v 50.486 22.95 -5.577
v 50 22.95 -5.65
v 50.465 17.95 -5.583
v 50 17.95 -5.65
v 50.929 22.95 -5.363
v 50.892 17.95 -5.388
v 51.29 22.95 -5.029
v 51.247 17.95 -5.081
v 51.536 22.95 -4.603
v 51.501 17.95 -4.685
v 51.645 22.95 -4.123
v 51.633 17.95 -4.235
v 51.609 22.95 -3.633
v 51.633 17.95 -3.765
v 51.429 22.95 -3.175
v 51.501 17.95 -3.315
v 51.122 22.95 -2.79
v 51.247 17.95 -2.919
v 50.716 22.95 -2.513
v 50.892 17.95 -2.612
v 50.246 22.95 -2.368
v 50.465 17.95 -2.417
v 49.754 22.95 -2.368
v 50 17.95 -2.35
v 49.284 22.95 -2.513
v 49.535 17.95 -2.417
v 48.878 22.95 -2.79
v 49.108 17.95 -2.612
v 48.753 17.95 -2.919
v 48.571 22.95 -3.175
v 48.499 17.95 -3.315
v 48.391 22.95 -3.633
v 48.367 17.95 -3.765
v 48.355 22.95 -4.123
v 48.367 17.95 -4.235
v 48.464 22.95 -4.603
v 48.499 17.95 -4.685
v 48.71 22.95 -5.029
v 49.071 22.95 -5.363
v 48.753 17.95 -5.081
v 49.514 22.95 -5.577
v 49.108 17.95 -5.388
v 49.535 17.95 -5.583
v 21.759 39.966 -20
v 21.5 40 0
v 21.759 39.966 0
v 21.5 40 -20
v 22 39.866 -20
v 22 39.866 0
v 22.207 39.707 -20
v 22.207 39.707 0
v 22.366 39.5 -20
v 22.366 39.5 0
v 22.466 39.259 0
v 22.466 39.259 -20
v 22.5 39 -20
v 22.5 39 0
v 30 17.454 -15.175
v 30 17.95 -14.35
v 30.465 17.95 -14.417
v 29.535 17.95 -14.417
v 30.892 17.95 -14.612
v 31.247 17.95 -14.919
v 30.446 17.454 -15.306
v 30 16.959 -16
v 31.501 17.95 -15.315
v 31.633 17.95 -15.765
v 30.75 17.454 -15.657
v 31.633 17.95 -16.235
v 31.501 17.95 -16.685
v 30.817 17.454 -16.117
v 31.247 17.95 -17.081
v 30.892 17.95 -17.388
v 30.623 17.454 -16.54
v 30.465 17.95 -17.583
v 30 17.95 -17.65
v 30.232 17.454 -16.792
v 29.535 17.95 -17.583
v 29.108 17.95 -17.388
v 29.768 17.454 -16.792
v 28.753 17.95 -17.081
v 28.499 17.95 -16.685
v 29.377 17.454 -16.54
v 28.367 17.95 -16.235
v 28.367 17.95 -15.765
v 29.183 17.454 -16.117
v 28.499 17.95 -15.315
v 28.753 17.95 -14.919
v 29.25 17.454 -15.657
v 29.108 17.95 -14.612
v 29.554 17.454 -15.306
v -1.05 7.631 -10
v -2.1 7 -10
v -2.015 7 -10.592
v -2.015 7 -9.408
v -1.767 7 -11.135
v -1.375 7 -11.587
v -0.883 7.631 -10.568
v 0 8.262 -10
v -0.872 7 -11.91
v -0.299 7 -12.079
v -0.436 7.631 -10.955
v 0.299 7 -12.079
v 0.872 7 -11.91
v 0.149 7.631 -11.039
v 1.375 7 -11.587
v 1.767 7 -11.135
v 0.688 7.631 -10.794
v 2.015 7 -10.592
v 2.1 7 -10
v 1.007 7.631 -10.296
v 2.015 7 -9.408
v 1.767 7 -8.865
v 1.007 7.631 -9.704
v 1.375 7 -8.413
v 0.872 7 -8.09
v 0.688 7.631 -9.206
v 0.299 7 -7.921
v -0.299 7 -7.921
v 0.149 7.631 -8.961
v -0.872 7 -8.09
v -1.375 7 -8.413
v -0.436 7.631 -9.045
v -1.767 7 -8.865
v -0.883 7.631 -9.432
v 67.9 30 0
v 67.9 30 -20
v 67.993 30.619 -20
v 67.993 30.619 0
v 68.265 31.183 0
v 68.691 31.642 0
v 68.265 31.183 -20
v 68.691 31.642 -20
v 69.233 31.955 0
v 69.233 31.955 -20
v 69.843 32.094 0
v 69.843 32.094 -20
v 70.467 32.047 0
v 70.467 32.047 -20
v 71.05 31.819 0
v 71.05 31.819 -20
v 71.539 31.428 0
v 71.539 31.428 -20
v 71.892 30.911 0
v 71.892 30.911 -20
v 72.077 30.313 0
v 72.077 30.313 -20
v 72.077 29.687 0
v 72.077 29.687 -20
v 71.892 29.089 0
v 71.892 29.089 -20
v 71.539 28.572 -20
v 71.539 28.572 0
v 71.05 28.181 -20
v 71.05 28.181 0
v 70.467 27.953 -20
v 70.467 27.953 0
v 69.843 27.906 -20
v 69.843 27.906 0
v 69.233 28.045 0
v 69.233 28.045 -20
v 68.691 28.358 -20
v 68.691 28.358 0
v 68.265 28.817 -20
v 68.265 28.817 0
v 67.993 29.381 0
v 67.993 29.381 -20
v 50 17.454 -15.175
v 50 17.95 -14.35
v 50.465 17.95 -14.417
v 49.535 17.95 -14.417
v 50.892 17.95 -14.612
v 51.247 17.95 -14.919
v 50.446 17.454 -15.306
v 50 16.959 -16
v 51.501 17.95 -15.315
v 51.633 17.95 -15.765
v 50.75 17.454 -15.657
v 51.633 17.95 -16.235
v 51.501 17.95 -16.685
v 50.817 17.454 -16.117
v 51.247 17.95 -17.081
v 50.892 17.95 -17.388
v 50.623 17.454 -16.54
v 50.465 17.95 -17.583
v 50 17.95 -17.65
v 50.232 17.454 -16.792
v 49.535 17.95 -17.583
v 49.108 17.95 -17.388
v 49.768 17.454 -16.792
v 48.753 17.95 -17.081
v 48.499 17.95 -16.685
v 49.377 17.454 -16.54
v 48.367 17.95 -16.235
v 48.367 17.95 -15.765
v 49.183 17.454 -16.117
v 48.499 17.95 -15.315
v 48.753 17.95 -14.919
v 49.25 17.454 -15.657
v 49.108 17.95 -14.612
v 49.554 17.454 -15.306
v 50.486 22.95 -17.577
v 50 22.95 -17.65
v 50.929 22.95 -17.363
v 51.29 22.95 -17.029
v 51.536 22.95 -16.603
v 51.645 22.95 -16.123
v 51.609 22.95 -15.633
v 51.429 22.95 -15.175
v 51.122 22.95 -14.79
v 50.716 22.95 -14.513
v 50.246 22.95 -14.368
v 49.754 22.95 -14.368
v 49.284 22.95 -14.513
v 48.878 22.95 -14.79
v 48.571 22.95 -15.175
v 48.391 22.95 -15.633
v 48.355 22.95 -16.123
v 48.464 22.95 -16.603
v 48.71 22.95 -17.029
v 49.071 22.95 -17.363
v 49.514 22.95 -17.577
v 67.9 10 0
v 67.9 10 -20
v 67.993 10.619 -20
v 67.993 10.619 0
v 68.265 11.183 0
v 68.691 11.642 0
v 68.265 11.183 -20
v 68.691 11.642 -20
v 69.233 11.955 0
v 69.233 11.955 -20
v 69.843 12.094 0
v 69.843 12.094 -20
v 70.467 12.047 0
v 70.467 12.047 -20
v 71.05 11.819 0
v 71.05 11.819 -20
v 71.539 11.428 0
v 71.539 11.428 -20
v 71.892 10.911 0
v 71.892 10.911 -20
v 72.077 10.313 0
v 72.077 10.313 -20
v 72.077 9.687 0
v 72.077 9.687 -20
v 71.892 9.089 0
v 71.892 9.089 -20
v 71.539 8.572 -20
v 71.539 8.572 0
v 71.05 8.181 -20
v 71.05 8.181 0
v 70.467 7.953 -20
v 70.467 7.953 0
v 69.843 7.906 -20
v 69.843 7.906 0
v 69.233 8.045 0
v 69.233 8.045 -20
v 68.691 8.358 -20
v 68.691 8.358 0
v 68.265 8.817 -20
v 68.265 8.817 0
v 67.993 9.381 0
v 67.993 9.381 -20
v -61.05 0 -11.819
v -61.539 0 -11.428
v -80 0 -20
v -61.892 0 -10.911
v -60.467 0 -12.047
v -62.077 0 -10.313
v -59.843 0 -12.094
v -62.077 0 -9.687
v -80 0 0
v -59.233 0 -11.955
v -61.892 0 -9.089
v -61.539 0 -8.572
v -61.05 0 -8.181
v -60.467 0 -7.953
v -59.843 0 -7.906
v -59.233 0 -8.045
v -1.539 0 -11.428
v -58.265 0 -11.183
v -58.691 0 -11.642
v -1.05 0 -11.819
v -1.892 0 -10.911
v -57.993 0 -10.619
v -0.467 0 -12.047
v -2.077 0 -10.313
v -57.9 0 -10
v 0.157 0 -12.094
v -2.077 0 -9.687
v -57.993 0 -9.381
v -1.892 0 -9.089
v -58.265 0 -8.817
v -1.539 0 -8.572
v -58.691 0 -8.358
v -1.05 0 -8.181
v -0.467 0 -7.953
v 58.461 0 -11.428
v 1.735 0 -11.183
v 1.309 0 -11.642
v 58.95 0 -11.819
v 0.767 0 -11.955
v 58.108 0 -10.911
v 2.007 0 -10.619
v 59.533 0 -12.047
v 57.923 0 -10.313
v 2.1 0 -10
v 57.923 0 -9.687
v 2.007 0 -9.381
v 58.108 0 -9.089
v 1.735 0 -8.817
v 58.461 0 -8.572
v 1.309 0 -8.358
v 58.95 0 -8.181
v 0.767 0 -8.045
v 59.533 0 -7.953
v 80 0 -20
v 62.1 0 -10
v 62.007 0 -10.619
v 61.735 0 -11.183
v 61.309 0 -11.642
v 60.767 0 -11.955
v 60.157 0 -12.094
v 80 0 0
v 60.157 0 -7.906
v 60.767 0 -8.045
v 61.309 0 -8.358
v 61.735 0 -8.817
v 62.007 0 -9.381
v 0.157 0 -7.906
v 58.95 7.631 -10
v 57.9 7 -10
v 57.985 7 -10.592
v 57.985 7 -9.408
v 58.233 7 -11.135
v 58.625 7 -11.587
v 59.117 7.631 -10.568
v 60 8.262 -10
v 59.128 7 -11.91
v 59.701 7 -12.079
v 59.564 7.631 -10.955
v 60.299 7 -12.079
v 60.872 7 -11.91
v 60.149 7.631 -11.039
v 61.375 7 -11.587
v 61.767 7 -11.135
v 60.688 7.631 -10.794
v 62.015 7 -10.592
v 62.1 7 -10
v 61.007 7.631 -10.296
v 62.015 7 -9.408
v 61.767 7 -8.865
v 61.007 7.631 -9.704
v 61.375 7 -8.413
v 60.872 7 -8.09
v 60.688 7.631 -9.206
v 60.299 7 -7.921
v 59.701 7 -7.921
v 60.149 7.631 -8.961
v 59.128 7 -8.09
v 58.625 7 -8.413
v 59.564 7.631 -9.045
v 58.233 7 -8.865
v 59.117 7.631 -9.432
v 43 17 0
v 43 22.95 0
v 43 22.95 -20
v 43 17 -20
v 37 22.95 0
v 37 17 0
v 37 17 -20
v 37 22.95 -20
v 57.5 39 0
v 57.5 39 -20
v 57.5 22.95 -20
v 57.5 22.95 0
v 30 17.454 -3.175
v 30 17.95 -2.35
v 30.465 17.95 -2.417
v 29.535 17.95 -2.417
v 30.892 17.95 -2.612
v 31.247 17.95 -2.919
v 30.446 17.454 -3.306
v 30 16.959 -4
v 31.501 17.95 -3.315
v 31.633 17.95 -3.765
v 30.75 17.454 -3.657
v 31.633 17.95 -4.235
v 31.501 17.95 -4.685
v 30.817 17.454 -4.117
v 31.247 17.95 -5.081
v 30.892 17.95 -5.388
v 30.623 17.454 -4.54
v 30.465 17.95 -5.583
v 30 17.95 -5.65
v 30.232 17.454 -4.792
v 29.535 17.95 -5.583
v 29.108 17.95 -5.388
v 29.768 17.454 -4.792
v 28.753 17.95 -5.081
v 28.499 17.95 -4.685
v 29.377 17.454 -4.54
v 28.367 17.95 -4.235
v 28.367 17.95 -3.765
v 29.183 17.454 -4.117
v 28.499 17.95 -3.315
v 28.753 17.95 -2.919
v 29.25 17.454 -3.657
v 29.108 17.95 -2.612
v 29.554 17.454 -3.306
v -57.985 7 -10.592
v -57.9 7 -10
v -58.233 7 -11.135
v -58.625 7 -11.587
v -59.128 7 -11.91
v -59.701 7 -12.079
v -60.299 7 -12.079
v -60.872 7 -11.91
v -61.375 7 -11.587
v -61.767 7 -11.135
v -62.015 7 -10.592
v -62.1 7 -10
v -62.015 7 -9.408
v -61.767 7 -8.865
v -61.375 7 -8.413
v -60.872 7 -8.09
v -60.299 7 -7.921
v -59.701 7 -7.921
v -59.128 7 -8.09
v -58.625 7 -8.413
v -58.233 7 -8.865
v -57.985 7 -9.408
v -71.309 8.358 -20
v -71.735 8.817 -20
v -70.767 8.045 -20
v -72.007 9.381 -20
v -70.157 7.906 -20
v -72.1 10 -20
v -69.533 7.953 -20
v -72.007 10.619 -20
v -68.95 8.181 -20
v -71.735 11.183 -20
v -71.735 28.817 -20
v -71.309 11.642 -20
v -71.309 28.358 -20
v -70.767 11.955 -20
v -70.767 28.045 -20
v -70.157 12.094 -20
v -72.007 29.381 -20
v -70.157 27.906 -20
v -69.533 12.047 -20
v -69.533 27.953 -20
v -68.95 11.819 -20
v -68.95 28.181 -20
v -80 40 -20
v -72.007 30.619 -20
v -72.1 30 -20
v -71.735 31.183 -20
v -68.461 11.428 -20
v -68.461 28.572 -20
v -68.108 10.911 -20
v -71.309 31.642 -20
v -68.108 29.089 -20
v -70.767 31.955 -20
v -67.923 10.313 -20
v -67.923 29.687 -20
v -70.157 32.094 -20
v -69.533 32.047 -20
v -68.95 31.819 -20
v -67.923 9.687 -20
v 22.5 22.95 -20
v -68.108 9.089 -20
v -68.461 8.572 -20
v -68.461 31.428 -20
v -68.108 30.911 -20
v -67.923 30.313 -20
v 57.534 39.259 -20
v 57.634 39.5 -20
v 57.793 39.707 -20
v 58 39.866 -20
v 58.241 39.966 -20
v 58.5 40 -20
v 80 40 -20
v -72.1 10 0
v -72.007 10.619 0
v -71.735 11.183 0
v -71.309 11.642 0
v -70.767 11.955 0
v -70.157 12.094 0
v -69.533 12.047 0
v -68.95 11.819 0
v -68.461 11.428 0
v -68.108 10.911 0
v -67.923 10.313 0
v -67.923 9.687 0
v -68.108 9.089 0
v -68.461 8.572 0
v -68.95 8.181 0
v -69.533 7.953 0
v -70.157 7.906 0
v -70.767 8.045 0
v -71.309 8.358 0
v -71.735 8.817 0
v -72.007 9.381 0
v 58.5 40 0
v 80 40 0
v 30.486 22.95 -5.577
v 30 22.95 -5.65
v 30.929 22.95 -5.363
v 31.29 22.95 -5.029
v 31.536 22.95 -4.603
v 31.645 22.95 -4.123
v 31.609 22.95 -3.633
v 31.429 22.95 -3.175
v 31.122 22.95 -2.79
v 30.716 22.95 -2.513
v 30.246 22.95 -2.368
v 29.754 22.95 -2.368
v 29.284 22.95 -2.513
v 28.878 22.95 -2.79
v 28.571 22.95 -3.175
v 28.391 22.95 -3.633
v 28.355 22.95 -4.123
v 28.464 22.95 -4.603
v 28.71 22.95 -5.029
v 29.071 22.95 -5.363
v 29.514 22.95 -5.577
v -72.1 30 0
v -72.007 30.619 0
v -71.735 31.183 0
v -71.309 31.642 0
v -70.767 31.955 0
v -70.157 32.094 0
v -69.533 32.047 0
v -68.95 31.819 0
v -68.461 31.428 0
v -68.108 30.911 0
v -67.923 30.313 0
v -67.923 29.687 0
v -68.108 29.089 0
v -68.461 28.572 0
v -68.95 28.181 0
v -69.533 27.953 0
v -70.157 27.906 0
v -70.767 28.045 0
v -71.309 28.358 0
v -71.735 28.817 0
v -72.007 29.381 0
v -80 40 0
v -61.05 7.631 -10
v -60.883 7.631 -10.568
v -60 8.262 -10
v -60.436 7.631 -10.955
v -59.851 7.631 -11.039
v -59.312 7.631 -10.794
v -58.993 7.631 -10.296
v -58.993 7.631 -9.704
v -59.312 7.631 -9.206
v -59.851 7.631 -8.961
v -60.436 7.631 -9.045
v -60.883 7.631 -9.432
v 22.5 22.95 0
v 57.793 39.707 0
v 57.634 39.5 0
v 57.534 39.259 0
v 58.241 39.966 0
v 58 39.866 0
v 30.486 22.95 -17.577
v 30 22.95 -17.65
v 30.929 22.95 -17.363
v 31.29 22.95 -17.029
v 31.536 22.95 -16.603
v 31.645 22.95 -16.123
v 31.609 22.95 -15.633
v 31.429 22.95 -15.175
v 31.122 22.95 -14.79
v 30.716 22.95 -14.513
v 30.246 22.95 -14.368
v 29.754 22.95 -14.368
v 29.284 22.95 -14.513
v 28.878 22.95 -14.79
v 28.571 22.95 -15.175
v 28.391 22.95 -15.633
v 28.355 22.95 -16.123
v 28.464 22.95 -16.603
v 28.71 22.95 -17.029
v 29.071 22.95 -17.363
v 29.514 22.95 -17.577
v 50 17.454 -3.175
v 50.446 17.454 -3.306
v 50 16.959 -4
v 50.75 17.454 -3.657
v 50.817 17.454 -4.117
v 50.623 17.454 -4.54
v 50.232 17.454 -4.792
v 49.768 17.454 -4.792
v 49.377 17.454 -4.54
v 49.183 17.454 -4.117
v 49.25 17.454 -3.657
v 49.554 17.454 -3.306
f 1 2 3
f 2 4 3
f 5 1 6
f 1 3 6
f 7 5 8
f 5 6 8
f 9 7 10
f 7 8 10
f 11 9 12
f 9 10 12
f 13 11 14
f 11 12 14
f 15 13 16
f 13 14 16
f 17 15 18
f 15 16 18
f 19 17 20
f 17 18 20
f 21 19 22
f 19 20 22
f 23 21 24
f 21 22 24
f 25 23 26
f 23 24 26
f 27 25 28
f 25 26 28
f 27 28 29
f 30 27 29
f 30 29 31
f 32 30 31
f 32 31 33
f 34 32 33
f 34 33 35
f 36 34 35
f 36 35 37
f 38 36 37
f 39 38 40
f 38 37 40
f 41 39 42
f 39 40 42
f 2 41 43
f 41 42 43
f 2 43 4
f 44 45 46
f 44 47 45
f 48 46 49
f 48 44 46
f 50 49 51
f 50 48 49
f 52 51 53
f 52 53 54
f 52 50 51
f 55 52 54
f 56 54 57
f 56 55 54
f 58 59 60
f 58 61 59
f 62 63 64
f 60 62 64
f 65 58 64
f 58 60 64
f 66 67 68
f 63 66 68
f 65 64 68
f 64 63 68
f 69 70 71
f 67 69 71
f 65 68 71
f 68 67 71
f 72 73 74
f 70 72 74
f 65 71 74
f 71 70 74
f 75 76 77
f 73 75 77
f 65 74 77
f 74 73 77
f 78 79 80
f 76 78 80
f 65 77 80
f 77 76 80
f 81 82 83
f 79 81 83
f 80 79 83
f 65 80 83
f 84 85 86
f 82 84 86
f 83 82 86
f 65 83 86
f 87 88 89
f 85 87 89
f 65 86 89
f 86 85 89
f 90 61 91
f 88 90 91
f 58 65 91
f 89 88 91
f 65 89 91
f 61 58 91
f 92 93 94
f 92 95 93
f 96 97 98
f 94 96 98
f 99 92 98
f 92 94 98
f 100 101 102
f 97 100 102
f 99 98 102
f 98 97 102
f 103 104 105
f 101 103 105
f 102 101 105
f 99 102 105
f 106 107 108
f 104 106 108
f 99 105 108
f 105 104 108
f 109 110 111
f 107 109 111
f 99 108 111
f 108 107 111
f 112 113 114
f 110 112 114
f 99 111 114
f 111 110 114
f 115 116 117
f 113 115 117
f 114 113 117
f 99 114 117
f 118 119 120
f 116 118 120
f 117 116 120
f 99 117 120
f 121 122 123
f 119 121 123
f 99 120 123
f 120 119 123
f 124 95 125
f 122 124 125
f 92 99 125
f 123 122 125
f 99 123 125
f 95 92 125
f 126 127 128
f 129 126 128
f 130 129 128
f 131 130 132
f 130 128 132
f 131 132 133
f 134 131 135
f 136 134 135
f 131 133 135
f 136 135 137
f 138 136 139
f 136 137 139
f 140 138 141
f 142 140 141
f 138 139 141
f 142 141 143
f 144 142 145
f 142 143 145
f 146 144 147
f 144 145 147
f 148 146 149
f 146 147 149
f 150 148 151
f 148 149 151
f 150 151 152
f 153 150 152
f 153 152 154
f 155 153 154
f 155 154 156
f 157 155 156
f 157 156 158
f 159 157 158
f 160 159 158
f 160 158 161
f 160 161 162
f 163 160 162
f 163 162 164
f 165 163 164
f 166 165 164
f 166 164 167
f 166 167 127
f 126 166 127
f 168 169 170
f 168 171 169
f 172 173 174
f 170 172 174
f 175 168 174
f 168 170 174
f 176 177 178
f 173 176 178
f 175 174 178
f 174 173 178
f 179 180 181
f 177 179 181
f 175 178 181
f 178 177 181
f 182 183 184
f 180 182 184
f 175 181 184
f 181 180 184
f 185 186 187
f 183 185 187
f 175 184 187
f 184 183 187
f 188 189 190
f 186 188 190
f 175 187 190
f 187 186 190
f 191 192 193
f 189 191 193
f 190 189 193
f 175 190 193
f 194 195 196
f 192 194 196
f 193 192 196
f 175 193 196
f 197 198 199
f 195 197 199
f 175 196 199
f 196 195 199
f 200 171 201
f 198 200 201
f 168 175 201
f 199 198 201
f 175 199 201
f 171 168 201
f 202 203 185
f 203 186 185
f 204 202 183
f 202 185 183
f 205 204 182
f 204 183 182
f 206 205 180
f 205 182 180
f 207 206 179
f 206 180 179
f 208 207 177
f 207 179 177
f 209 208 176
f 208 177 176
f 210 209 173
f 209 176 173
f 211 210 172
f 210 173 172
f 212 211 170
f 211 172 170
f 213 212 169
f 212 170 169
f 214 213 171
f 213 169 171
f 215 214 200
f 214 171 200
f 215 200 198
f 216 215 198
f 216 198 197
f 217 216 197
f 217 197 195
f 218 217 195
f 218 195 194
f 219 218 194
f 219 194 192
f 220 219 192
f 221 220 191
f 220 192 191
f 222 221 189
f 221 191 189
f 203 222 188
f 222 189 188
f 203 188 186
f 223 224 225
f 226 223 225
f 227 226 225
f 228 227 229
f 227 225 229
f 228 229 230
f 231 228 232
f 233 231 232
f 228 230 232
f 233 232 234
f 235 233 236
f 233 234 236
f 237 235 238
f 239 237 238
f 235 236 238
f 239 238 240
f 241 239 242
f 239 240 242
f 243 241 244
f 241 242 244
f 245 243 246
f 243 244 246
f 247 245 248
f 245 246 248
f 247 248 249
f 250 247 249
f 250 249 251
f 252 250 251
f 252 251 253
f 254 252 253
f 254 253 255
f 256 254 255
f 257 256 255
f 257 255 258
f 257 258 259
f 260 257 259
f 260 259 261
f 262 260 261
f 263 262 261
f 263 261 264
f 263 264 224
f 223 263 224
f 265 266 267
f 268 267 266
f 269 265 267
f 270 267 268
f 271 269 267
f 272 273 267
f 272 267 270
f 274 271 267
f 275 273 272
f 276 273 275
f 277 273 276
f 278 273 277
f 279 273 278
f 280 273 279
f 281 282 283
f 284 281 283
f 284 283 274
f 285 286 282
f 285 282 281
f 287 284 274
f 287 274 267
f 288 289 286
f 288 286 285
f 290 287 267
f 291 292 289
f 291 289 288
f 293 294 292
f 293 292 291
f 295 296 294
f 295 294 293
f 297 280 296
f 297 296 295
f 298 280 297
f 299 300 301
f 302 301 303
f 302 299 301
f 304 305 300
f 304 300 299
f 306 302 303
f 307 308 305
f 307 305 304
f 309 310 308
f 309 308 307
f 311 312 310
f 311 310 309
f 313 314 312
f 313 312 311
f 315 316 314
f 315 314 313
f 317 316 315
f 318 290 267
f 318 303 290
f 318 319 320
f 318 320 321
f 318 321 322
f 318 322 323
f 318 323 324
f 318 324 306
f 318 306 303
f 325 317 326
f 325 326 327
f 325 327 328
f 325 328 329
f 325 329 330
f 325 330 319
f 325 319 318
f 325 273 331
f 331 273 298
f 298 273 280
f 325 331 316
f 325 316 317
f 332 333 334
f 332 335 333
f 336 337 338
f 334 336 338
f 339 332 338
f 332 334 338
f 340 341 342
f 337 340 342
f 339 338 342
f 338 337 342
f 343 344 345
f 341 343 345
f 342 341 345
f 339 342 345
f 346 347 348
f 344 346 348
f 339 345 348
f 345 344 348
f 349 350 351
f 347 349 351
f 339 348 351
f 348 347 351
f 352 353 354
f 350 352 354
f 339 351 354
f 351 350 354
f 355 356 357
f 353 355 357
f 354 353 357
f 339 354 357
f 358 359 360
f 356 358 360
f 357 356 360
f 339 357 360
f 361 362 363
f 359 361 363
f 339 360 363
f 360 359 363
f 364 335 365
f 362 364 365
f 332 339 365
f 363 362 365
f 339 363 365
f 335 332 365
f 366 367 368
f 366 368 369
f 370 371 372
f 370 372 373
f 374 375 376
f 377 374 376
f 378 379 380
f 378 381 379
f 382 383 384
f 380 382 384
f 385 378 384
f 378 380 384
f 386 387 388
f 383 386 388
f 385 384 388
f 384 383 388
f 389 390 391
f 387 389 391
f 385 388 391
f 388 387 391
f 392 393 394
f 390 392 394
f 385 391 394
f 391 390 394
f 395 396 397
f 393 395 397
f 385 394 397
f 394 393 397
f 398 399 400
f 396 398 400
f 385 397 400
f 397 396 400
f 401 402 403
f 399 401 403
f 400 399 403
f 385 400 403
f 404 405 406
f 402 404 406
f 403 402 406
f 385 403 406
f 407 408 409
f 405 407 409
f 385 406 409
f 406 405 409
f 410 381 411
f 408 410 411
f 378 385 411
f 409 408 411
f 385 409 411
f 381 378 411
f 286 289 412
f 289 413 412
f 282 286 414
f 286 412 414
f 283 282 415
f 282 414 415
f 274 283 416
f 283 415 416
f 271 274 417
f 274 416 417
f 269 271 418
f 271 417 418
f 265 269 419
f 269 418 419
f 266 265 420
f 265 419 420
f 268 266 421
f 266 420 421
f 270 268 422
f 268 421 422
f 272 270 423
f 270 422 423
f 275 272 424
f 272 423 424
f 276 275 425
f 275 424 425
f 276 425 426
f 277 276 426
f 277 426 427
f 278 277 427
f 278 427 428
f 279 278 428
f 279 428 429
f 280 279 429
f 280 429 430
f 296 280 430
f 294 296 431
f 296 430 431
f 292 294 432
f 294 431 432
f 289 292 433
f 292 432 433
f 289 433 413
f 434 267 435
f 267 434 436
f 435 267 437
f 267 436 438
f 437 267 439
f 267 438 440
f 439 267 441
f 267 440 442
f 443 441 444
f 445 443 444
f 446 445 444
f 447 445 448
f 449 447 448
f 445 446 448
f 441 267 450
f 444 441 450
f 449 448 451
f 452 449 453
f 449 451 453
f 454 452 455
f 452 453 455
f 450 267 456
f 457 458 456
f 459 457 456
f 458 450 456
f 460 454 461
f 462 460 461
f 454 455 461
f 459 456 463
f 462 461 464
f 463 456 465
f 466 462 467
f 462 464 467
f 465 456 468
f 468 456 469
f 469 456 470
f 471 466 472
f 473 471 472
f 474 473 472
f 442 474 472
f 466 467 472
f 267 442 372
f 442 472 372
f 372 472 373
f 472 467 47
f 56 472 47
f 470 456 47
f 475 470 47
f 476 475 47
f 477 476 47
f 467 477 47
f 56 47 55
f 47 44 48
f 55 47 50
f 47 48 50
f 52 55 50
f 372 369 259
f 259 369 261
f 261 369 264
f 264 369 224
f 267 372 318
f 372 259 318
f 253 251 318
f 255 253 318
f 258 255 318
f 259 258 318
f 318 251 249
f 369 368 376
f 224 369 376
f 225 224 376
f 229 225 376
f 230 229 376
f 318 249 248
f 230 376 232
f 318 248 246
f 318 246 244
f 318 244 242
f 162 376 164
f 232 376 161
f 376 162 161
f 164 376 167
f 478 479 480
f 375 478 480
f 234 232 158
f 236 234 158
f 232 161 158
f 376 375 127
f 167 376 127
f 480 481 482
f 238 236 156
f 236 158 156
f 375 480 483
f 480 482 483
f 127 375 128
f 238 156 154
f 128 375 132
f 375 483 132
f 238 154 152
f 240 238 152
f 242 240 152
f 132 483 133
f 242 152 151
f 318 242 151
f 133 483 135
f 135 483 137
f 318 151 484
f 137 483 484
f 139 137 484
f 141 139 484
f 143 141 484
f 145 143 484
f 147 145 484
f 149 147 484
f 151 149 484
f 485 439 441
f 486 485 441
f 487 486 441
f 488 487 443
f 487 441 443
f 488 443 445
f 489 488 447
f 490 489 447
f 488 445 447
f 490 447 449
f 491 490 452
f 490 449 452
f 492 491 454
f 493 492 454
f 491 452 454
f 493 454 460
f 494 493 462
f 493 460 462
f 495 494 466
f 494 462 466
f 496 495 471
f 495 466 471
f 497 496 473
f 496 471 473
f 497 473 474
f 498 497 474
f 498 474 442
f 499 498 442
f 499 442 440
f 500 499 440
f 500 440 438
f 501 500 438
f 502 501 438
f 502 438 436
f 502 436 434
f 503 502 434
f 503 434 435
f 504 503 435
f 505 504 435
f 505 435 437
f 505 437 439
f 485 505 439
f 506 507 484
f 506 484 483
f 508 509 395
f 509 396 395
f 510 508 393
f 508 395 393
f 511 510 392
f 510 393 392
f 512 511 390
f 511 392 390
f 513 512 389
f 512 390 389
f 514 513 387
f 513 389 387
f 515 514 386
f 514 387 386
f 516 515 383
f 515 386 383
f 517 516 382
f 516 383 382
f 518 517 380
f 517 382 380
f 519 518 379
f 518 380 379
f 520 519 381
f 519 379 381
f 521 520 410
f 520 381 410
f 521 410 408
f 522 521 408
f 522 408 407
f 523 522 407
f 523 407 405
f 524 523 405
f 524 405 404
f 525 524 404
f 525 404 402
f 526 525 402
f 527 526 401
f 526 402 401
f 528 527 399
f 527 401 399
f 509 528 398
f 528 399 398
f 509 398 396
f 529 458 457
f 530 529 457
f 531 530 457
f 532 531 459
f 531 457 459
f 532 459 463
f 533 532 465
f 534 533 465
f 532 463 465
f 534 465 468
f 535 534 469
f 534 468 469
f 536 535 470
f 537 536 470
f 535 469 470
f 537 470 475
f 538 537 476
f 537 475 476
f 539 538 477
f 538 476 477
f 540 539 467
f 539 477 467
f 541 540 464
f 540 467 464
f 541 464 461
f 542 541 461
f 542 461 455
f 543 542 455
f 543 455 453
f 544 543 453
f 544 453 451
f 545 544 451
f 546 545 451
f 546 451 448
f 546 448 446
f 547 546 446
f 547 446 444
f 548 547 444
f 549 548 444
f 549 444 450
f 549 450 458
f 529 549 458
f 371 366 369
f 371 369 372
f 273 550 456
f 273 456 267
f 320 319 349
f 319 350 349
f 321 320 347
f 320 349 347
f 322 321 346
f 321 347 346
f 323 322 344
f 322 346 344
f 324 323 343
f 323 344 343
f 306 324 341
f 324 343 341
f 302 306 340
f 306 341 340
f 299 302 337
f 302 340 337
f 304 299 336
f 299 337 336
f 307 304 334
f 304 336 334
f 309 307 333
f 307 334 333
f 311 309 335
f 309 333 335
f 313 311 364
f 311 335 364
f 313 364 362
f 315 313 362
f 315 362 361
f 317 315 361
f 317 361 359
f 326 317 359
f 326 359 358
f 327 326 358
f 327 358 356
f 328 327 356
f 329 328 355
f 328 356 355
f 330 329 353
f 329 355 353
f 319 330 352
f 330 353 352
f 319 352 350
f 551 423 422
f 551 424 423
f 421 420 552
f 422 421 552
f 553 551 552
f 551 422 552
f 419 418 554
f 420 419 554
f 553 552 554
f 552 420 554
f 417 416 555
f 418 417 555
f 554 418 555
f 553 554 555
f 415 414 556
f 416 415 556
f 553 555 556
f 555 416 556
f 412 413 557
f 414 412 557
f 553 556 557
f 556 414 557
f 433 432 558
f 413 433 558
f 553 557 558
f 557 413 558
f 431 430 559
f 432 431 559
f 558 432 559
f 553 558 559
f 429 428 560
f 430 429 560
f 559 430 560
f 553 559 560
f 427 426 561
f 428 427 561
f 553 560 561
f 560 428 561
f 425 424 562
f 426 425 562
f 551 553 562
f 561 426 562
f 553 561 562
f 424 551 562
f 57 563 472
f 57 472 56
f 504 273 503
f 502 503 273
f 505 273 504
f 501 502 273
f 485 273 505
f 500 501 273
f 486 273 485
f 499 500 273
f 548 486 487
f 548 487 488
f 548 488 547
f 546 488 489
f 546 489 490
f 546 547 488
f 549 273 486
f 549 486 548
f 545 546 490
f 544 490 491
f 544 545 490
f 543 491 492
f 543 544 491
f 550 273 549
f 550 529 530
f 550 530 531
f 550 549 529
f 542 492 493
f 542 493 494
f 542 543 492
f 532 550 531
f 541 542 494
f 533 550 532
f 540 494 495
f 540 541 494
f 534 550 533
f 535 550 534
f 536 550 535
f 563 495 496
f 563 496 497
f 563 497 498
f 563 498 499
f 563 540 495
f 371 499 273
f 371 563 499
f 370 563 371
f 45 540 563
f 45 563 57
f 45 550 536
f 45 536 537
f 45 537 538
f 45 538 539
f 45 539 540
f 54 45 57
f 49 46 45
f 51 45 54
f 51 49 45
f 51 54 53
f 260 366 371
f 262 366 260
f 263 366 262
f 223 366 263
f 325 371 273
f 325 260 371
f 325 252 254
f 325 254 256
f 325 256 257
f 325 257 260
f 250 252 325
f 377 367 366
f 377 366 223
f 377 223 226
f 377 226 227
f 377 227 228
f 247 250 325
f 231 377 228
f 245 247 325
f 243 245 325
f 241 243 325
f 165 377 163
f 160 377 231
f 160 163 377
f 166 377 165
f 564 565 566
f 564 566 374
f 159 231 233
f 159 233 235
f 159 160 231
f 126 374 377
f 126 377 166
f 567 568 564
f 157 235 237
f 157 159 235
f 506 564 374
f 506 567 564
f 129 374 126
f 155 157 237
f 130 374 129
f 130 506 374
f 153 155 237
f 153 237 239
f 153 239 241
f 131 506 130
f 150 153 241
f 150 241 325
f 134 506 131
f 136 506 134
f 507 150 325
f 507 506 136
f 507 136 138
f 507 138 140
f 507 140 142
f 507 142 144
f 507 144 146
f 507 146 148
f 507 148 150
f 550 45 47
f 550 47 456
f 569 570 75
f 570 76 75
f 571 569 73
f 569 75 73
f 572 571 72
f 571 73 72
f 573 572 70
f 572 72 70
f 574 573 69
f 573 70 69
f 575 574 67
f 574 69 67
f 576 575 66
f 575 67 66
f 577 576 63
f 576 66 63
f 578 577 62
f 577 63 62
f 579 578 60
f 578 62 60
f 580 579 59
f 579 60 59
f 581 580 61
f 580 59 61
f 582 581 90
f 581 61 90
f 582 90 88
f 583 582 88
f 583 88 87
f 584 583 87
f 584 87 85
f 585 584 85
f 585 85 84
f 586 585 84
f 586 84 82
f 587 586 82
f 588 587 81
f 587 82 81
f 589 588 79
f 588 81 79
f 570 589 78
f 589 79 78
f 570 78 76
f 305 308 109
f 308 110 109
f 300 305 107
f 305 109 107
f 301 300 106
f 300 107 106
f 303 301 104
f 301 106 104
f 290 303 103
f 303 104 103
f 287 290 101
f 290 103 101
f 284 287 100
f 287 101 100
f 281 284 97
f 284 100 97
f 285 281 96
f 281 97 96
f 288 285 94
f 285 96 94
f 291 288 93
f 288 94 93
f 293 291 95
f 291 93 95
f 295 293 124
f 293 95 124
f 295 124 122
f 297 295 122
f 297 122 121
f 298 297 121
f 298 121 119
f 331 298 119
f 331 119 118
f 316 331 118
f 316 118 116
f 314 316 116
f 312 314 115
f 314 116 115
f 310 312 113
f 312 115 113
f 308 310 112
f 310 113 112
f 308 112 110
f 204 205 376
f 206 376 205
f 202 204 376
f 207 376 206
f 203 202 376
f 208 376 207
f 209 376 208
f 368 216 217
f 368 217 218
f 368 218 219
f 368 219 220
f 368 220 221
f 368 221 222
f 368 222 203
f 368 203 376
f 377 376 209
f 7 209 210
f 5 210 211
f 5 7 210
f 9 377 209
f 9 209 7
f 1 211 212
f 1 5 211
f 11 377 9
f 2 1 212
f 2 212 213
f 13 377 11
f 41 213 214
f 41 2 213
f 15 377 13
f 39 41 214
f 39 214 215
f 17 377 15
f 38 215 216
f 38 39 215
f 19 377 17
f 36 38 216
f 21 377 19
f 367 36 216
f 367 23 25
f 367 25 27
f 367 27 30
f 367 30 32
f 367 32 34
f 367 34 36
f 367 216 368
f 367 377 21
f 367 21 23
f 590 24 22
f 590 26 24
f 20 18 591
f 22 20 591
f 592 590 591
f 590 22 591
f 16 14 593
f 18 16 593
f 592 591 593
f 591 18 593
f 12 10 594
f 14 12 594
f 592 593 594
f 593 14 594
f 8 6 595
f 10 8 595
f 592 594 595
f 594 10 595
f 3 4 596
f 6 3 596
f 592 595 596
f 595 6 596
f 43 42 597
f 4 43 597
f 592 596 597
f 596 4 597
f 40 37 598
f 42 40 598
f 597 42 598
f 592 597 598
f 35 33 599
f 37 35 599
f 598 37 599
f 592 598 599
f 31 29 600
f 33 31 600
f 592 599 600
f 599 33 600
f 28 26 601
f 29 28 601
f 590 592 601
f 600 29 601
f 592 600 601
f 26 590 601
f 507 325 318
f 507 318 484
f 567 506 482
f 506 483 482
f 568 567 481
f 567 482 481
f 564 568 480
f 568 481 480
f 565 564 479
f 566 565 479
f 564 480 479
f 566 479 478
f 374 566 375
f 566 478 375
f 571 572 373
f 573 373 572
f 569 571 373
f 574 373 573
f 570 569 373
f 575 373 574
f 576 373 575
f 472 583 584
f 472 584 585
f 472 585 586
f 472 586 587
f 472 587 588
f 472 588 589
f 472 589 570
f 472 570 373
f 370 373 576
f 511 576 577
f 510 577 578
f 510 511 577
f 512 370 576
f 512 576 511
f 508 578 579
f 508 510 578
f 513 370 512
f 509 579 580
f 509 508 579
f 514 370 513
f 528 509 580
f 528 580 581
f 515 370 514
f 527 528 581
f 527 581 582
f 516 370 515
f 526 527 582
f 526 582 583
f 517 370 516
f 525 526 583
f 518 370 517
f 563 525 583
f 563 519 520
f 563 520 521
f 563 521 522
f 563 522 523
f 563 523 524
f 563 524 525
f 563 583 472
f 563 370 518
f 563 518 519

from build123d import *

# Parameters (mm, degrees)
BOSS_EXTRUDE1_DEPTH             = 20
TAP_DRILL_FOR_M4X0_7_TAP1_D     = 3.3
TAP_DRILL_FOR_M4X0_7_TAP1_DEPTH = 5
TAP_DRILL_FOR_M4X0_7_TAP1_TIP   = 0.991420021
TAP_DRILL_FOR_M5X0_8_TAP3_D     = 4.2
TAP_DRILL_FOR_M5X0_8_TAP2_D     = 4.2
TAP_DRILL_FOR_M5X0_8_TAP2_DEPTH = 7
TAP_DRILL_FOR_M5X0_8_TAP2_TIP   = 1.2618073
FILLET1_R                       = 1


with BuildPart() as part:
    # Sketch1 → Boss-Extrude1 (new body)
    with BuildSketch(Plane.XY):
        Polygon((22.5, 40), (-80, 40), (-80, 0), (80, 0), (80, 40), (57.5, 40), (57.5, 23), (57.5, 22.95), (43, 22.95), (43, 17), (37, 17), (37, 22.95), (22.5, 22.95), (22.5, 23), align=None)
    extrude(amount=-BOSS_EXTRUDE1_DEPTH)

    # Tap Drill for M4x0.7 Tap1
    with Locations(Plane(origin=(30, 22.95, -4), x_dir=(0, 0, 1), z_dir=(0, 1, 0))):
        with Locations((0, 0), (0, 20), (-12, 0), (-12, 20)):
            Hole(TAP_DRILL_FOR_M4X0_7_TAP1_D / 2, depth=TAP_DRILL_FOR_M4X0_7_TAP1_DEPTH)
            with Locations((0, 0, -(TAP_DRILL_FOR_M4X0_7_TAP1_DEPTH + TAP_DRILL_FOR_M4X0_7_TAP1_TIP / 2))):  # 118° drill point
                Cone(0, TAP_DRILL_FOR_M4X0_7_TAP1_D / 2, TAP_DRILL_FOR_M4X0_7_TAP1_TIP, mode=Mode.SUBTRACT)

    # Tap Drill for M5x0.8 Tap3 (through all)
    with Locations(Plane(origin=(-70, 30, 0), x_dir=(1, 0, 0), z_dir=(0, 0, 1))):
        with Locations((0, 0), (0, -20), (140, -20), (140, 0)):
            Hole(TAP_DRILL_FOR_M5X0_8_TAP3_D / 2)

    # Tap Drill for M5x0.8 Tap2
    with Locations(Plane(origin=(-60, 0, -10), x_dir=(-1, 0, 0), z_dir=(0, -1, 0))):
        with Locations((0, 0), (-60, 0), (-120, 0)):
            Hole(TAP_DRILL_FOR_M5X0_8_TAP2_D / 2, depth=TAP_DRILL_FOR_M5X0_8_TAP2_DEPTH)
            with Locations((0, 0, -(TAP_DRILL_FOR_M5X0_8_TAP2_DEPTH + TAP_DRILL_FOR_M5X0_8_TAP2_TIP / 2))):  # 118° drill point
                Cone(0, TAP_DRILL_FOR_M5X0_8_TAP2_D / 2, TAP_DRILL_FOR_M5X0_8_TAP2_TIP, mode=Mode.SUBTRACT)

    # Fillet1
    fillet1_edges = [part.edges().sort_by_distance(p)[0] for p in [
        (57.5, 40, -10),
        (22.5, 40, -10),
    ]]
    fillet(fillet1_edges, radius=FILLET1_R)


solid = part.part
